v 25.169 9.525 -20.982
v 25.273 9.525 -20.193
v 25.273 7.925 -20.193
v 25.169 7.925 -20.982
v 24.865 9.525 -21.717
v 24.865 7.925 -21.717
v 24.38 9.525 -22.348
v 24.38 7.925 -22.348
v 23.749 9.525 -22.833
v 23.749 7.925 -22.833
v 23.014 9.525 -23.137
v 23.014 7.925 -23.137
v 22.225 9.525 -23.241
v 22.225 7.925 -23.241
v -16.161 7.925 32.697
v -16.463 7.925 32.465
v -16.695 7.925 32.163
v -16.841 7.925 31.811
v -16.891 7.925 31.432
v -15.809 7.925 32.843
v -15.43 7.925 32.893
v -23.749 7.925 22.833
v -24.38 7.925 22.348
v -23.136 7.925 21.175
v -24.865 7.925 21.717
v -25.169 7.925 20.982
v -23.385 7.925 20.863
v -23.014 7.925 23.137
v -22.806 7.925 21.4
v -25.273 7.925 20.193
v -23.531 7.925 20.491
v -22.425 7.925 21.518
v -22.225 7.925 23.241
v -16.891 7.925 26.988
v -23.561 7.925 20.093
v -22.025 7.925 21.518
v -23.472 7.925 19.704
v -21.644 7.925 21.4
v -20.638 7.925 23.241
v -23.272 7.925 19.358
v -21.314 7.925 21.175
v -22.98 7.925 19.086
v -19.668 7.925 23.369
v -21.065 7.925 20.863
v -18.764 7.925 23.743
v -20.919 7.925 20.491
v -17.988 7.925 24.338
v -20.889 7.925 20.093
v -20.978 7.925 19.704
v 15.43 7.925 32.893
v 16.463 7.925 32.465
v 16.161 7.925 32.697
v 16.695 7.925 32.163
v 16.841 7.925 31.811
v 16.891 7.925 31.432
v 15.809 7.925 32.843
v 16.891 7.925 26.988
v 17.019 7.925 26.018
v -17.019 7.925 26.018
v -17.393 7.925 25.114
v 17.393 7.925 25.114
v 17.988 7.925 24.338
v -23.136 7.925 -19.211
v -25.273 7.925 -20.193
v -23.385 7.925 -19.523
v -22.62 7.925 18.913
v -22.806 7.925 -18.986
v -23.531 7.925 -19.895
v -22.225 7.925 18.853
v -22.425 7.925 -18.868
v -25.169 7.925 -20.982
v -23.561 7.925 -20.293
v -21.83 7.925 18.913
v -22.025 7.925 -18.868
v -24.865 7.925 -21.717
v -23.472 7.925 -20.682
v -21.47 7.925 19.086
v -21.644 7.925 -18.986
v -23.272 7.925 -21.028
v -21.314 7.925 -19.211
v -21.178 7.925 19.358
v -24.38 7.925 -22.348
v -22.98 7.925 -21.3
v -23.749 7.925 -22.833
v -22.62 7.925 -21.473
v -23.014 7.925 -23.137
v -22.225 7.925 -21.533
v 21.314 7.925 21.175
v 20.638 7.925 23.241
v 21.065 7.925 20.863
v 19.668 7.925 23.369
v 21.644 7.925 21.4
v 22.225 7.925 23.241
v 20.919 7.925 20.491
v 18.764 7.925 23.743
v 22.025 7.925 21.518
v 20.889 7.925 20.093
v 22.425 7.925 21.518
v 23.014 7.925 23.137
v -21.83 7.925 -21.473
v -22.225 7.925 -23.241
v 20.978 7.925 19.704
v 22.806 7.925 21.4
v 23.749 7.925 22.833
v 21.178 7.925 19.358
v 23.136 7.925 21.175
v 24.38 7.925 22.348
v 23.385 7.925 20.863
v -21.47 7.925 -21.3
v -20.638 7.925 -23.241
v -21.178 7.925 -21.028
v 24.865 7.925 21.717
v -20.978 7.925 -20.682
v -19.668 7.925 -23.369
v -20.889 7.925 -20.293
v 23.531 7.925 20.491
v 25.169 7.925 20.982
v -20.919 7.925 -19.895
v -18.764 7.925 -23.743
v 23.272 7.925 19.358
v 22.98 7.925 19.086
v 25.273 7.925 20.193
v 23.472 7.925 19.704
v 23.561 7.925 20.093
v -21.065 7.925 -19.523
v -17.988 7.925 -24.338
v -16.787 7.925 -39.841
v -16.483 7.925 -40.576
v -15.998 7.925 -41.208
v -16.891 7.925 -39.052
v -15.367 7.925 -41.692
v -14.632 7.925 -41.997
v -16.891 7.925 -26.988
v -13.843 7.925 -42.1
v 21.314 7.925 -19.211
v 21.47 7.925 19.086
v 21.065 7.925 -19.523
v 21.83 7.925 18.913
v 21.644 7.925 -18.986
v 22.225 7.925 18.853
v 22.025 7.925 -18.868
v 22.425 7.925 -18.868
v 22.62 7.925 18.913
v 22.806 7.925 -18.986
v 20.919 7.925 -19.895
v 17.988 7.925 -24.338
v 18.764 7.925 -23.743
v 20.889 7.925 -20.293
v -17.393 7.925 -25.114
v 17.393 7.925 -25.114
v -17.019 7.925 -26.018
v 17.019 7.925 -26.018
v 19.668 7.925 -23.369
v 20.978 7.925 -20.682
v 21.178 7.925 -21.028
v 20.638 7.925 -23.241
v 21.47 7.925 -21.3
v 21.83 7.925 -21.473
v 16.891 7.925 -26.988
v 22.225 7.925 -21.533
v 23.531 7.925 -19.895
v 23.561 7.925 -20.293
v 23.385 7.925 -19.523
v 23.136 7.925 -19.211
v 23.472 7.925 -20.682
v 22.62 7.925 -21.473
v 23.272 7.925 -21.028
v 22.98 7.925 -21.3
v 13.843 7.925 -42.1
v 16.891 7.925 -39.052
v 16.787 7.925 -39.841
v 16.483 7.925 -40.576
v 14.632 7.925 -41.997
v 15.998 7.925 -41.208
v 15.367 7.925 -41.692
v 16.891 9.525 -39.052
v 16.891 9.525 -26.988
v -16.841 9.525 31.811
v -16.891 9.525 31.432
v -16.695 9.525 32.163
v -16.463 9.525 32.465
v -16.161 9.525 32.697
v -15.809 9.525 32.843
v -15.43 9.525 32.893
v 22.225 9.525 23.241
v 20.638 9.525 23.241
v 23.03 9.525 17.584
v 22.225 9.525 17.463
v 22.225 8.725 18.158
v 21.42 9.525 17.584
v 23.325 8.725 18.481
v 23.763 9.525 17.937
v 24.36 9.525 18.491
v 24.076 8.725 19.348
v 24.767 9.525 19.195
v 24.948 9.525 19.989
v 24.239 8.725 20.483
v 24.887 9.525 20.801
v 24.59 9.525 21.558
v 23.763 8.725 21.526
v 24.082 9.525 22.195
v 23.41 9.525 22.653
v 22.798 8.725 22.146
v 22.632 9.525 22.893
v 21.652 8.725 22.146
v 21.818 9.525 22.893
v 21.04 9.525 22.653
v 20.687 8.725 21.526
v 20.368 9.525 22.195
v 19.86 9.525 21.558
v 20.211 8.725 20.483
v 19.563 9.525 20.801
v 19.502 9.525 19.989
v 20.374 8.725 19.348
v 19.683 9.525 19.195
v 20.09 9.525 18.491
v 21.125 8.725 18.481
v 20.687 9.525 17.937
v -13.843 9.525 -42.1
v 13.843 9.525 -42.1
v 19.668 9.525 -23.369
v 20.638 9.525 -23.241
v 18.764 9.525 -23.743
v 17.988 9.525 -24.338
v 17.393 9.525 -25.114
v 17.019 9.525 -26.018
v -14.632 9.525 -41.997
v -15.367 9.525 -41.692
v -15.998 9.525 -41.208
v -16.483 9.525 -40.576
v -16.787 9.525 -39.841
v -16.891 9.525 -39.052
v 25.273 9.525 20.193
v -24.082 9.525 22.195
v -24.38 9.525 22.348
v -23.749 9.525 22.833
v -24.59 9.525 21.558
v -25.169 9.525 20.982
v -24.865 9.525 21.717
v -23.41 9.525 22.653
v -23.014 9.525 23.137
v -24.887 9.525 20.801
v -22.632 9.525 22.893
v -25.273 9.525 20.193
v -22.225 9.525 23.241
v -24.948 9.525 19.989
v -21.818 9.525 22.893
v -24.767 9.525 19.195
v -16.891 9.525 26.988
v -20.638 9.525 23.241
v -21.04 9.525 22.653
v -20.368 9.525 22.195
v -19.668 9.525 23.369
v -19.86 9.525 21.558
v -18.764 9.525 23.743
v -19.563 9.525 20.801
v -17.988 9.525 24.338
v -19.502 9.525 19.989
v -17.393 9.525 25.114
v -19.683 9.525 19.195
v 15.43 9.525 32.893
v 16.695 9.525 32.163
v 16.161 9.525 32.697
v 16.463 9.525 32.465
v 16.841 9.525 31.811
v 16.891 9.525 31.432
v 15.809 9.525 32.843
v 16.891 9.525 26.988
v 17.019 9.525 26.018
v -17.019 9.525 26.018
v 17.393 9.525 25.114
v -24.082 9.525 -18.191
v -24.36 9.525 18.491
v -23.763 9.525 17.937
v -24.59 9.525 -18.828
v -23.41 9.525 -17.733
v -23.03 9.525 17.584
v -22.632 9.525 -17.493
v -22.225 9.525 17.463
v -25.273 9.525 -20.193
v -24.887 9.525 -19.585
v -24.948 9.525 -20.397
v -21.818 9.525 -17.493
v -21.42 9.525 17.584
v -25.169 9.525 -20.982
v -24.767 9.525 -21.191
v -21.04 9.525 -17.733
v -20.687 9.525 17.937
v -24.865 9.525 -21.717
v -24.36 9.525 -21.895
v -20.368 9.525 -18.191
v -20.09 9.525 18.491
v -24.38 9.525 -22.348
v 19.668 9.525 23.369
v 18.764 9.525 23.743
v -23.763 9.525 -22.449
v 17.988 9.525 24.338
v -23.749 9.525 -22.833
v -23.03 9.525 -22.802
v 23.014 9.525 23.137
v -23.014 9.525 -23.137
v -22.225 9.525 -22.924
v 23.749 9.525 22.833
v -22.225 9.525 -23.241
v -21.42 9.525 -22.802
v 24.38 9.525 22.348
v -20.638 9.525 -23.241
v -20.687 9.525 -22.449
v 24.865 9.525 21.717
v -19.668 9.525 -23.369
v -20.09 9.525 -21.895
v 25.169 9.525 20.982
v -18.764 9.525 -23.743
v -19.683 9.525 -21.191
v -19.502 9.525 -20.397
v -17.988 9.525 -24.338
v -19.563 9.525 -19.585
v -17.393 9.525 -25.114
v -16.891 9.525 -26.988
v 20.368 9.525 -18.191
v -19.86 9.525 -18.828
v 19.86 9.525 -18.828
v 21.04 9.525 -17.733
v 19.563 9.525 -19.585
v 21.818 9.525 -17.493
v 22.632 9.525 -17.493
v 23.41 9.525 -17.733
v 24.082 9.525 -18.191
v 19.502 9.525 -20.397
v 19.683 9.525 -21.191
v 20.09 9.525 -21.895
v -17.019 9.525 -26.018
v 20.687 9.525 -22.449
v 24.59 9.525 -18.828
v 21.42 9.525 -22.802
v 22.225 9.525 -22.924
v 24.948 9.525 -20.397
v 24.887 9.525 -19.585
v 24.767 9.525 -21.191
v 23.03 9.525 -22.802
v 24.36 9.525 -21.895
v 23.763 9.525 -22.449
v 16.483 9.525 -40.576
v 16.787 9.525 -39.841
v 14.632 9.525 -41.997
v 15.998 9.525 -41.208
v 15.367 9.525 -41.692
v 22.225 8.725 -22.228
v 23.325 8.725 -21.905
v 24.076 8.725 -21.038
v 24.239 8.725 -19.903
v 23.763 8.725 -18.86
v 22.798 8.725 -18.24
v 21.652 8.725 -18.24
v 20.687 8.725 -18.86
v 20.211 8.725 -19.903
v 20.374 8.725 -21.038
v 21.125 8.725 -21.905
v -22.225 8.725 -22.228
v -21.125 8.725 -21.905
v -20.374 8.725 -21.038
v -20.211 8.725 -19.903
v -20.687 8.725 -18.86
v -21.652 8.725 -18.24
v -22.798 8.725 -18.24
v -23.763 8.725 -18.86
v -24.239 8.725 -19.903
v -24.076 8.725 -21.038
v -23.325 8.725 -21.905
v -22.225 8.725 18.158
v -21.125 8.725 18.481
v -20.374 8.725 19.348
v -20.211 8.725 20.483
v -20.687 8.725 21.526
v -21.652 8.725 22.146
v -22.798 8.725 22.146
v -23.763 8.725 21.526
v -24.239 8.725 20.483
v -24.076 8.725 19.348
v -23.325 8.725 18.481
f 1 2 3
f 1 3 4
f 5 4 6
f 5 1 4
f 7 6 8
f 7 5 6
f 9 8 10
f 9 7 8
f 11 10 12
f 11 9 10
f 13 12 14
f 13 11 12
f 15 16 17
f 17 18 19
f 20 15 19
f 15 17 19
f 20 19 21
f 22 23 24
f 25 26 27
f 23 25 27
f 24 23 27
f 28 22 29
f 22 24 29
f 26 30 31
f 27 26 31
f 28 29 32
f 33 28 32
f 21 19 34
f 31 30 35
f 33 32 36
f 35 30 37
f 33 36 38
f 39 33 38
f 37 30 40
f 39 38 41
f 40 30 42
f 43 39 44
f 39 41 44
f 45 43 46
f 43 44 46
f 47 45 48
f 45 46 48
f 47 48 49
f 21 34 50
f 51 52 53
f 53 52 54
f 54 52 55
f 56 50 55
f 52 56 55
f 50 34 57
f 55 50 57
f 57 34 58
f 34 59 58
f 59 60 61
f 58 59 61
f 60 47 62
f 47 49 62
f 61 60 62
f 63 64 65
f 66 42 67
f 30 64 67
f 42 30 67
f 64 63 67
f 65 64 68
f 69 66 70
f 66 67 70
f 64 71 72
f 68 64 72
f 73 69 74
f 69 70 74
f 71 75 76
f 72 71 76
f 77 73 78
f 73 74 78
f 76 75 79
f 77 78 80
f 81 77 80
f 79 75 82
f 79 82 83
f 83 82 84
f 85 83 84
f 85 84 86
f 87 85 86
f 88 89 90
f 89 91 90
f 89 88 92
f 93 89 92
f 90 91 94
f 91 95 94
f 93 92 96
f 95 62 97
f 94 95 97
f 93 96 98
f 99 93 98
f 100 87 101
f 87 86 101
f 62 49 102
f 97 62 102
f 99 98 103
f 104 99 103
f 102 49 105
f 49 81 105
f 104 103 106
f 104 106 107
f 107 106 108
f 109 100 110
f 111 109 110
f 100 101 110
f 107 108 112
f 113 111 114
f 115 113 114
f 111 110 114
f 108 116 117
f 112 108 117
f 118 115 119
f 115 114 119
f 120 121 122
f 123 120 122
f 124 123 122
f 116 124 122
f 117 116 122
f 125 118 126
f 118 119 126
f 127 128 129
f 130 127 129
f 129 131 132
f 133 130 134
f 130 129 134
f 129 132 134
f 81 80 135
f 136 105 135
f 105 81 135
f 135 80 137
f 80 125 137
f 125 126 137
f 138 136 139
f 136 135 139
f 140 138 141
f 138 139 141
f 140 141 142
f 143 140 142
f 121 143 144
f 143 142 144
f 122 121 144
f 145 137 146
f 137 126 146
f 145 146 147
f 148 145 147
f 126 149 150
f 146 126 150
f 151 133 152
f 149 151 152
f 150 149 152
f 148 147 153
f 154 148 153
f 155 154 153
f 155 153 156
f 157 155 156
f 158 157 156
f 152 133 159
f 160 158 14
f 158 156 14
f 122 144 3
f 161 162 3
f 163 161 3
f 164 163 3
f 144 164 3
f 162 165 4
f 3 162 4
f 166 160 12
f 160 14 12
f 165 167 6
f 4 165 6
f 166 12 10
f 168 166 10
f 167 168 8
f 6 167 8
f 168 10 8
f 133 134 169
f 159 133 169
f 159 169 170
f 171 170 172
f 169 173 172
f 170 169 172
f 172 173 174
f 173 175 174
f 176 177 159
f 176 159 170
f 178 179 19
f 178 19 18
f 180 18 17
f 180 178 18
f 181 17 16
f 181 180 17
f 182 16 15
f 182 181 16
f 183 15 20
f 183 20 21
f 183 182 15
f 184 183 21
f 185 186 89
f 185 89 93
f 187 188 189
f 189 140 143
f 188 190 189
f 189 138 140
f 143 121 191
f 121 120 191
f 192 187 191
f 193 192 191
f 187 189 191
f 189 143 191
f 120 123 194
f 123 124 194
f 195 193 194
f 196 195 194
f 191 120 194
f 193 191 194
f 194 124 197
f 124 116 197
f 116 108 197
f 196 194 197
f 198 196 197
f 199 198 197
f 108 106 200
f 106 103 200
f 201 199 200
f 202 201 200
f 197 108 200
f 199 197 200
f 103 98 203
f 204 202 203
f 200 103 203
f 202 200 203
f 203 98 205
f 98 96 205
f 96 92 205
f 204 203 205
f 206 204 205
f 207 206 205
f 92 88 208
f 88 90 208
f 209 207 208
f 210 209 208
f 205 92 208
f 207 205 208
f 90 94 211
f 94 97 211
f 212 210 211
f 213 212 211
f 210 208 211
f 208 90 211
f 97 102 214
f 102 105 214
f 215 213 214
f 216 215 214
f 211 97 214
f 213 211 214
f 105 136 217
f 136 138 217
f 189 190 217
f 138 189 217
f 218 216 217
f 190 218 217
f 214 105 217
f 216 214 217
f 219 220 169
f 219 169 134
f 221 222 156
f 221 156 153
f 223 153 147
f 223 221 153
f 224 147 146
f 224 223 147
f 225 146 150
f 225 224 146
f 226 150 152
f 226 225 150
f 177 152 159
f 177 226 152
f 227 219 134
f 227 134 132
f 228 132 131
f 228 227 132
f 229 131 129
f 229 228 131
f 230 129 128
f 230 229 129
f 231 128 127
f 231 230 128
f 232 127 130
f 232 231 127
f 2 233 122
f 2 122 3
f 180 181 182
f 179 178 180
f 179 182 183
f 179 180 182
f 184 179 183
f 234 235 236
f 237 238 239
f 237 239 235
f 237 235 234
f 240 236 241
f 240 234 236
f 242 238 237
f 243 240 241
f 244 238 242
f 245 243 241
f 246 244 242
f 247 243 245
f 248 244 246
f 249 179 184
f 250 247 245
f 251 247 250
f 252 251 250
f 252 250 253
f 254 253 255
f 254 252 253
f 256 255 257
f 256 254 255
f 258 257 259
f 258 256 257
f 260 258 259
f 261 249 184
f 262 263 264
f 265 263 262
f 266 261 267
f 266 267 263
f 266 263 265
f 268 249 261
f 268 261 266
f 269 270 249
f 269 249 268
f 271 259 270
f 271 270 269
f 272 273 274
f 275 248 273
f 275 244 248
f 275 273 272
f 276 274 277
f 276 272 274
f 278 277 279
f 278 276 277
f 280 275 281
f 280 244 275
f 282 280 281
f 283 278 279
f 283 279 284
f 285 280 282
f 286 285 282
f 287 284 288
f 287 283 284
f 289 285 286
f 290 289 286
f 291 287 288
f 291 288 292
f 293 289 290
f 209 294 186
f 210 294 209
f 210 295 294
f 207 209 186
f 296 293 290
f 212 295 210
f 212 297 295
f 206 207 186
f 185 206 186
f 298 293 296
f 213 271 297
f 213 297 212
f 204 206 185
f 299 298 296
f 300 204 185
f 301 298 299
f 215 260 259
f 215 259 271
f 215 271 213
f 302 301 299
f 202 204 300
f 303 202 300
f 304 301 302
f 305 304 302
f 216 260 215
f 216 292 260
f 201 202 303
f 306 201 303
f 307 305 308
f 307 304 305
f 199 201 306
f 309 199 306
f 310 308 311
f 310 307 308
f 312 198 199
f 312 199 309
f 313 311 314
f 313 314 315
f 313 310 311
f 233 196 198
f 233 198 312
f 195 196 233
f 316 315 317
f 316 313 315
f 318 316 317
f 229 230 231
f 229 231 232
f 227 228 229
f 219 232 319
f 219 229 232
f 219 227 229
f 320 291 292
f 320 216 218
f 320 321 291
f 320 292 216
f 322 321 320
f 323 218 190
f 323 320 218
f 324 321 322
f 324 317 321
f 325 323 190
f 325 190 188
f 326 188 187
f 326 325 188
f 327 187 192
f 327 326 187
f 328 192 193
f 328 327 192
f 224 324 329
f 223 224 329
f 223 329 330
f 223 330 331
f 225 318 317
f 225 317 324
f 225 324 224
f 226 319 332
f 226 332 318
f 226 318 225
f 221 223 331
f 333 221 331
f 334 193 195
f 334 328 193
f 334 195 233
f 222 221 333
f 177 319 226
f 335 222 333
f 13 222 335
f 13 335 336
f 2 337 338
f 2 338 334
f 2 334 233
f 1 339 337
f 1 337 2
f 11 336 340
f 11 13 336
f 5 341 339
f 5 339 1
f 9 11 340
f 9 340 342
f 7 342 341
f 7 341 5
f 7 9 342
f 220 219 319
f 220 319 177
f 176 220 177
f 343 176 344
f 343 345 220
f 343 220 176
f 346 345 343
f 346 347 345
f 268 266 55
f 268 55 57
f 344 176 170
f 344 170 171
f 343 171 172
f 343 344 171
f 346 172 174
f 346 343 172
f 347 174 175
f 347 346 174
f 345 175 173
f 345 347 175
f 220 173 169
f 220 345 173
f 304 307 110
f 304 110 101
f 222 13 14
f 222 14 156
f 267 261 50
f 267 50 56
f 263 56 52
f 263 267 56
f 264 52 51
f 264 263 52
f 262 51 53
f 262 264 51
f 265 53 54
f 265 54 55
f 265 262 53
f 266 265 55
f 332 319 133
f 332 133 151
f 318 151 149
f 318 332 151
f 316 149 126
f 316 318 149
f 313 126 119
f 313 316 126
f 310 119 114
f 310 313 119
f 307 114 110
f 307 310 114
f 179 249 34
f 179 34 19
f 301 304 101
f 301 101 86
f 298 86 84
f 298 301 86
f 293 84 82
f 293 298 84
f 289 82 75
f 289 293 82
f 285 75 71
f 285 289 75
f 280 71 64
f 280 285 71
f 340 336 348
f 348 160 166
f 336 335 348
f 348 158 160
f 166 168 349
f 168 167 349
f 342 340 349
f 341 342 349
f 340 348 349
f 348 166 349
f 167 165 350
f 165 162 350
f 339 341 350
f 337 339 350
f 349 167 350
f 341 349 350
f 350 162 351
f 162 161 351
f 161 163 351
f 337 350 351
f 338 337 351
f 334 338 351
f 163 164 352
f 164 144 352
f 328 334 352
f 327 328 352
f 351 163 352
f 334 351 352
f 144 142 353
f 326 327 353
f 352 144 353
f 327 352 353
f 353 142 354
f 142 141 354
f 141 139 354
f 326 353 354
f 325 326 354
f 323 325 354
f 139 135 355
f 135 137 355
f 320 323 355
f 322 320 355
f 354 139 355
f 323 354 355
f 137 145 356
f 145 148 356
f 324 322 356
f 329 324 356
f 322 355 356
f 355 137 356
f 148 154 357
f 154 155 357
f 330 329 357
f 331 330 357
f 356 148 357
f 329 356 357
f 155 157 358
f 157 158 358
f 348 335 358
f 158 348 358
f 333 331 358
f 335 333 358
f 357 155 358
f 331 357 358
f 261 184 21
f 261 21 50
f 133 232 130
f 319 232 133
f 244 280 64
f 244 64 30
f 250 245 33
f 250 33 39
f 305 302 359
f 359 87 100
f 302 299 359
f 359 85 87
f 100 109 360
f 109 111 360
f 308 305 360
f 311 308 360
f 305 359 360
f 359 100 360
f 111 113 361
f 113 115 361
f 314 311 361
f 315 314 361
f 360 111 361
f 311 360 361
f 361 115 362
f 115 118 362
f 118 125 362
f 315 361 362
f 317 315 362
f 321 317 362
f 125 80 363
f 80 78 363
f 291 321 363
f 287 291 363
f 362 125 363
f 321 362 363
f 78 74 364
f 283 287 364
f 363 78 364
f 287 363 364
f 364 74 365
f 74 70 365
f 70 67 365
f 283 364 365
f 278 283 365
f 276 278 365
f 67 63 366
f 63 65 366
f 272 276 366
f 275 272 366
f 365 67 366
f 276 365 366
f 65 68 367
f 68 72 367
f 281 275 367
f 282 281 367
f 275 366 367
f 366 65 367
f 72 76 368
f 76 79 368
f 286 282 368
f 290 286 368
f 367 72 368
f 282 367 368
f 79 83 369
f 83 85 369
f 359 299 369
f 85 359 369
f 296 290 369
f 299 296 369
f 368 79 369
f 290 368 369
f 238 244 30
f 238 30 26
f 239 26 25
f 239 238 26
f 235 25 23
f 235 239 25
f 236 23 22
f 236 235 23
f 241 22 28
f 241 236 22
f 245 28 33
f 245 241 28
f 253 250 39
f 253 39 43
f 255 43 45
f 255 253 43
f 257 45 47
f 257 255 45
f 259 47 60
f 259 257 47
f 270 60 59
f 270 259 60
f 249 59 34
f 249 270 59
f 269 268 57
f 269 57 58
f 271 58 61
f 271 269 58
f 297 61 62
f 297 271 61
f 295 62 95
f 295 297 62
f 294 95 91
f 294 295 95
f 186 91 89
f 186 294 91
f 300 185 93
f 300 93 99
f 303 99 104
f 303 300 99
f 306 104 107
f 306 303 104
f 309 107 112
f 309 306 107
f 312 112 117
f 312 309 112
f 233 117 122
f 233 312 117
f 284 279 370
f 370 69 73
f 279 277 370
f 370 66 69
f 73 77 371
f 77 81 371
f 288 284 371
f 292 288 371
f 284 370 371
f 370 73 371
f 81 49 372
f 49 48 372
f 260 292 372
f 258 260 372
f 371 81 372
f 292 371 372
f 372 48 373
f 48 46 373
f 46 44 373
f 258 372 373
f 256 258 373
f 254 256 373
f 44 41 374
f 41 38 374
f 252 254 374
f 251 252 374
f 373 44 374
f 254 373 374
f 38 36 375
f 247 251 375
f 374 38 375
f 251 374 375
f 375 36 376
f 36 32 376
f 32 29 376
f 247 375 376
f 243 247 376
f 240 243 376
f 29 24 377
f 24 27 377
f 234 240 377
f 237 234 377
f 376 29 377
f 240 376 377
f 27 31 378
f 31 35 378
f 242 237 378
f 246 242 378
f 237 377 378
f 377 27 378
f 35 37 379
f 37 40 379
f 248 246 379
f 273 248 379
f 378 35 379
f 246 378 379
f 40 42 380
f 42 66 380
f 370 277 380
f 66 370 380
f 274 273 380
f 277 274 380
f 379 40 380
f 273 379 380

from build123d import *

# Parameters (mm, degrees)
BOSS_EXTRUDE3_DEPTH                            = 1.6
CSK_FOR_2_FLAT_HEAD_MACHINE_SCREW1_D           = 2.4384
CSK_FOR_2_FLAT_HEAD_MACHINE_SCREW1_DEPTH       = 5.588
CSK_FOR_2_FLAT_HEAD_MACHINE_SCREW1_CSINK_D     = 5.461
CSK_FOR_2_FLAT_HEAD_MACHINE_SCREW1_CSINK_ANGLE = 82
CSK_FOR_2_FLAT_HEAD_MACHINE_SCREW1_TIP         = 0.732569267


with BuildPart() as part:
    # Sketch1 → Boss-Extrude3 (new body)
    with BuildSketch(Plane(origin=(0, 9.525, 0), x_dir=(1, 0, 0), z_dir=(0, 1, 0))):
        with BuildLine():
            Line((-16.891, 39.0525), (-16.891, 26.9875))
            ThreePointArc((-16.891, 26.9875), (-17.988324444, 24.338324444), (-20.6375, 23.241))
            Line((-20.6375, 23.241), (-22.225, 23.241))
            ThreePointArc((-22.225, 23.241), (-24.380261469, 22.348261469), (-25.273, 20.193))
            Line((-25.273, 20.193), (-25.273, -20.193))
            ThreePointArc((-25.273, -20.193), (-24.380261469, -22.348261469), (-22.225, -23.241))
            Line((-22.225, -23.241), (-20.6375, -23.241))
            ThreePointArc((-20.6375, -23.241), (-17.988324444, -24.338324444), (-16.891, -26.9875))
            Line((-16.891, -26.9875), (-16.891, -31.4325))
            ThreePointArc((-16.891, -31.4325), (-16.463229454, -32.465229454), (-15.4305, -32.893))
            Line((-15.4305, -32.893), (15.4305, -32.893))
            ThreePointArc((15.4305, -32.893), (16.463229454, -32.465229454), (16.891, -31.4325))
            Line((16.891, -31.4325), (16.891, -26.9875))
            ThreePointArc((16.891, -26.9875), (17.988324444, -24.338324444), (20.6375, -23.241))
            Line((20.6375, -23.241), (22.225, -23.241))
            ThreePointArc((22.225, -23.241), (24.380261469, -22.348261469), (25.273, -20.193))
            Line((25.273, -20.193), (25.273, 20.193))
            ThreePointArc((25.273, 20.193), (24.380261469, 22.348261469), (22.225, 23.241))
            Line((22.225, 23.241), (20.6375, 23.241))
            ThreePointArc((20.6375, 23.241), (17.988324444, 24.338324444), (16.891, 26.9875))
            Line((16.891, 26.9875), (16.891, 39.0525))
            ThreePointArc((16.891, 39.0525), (15.998261469, 41.207761469), (13.843, 42.1005))
            Line((13.843, 42.1005), (-13.843, 42.1005))
            ThreePointArc((-13.843, 42.1005), (-15.998261469, 41.207761469), (-16.891, 39.0525))
        make_face()
    extrude(amount=-BOSS_EXTRUDE3_DEPTH)

    # CSK for #2 Flat Head Machine Screw1
    with Locations(Plane(origin=(22.225, 9.525, 20.193), x_dir=(0, 0, 1), z_dir=(0, 1, 0))):
        with Locations((0, 0), (0, -44.45), (-40.386, -44.45), (-40.386, 0)):
            CounterSinkHole(CSK_FOR_2_FLAT_HEAD_MACHINE_SCREW1_D / 2, CSK_FOR_2_FLAT_HEAD_MACHINE_SCREW1_CSINK_D / 2, depth=CSK_FOR_2_FLAT_HEAD_MACHINE_SCREW1_DEPTH, counter_sink_angle=CSK_FOR_2_FLAT_HEAD_MACHINE_SCREW1_CSINK_ANGLE)
            with Locations((0, 0, -(CSK_FOR_2_FLAT_HEAD_MACHINE_SCREW1_DEPTH + CSK_FOR_2_FLAT_HEAD_MACHINE_SCREW1_TIP / 2))):  # 118° drill point
                Cone(0, CSK_FOR_2_FLAT_HEAD_MACHINE_SCREW1_D / 2, CSK_FOR_2_FLAT_HEAD_MACHINE_SCREW1_TIP, mode=Mode.SUBTRACT)


solid = part.part
